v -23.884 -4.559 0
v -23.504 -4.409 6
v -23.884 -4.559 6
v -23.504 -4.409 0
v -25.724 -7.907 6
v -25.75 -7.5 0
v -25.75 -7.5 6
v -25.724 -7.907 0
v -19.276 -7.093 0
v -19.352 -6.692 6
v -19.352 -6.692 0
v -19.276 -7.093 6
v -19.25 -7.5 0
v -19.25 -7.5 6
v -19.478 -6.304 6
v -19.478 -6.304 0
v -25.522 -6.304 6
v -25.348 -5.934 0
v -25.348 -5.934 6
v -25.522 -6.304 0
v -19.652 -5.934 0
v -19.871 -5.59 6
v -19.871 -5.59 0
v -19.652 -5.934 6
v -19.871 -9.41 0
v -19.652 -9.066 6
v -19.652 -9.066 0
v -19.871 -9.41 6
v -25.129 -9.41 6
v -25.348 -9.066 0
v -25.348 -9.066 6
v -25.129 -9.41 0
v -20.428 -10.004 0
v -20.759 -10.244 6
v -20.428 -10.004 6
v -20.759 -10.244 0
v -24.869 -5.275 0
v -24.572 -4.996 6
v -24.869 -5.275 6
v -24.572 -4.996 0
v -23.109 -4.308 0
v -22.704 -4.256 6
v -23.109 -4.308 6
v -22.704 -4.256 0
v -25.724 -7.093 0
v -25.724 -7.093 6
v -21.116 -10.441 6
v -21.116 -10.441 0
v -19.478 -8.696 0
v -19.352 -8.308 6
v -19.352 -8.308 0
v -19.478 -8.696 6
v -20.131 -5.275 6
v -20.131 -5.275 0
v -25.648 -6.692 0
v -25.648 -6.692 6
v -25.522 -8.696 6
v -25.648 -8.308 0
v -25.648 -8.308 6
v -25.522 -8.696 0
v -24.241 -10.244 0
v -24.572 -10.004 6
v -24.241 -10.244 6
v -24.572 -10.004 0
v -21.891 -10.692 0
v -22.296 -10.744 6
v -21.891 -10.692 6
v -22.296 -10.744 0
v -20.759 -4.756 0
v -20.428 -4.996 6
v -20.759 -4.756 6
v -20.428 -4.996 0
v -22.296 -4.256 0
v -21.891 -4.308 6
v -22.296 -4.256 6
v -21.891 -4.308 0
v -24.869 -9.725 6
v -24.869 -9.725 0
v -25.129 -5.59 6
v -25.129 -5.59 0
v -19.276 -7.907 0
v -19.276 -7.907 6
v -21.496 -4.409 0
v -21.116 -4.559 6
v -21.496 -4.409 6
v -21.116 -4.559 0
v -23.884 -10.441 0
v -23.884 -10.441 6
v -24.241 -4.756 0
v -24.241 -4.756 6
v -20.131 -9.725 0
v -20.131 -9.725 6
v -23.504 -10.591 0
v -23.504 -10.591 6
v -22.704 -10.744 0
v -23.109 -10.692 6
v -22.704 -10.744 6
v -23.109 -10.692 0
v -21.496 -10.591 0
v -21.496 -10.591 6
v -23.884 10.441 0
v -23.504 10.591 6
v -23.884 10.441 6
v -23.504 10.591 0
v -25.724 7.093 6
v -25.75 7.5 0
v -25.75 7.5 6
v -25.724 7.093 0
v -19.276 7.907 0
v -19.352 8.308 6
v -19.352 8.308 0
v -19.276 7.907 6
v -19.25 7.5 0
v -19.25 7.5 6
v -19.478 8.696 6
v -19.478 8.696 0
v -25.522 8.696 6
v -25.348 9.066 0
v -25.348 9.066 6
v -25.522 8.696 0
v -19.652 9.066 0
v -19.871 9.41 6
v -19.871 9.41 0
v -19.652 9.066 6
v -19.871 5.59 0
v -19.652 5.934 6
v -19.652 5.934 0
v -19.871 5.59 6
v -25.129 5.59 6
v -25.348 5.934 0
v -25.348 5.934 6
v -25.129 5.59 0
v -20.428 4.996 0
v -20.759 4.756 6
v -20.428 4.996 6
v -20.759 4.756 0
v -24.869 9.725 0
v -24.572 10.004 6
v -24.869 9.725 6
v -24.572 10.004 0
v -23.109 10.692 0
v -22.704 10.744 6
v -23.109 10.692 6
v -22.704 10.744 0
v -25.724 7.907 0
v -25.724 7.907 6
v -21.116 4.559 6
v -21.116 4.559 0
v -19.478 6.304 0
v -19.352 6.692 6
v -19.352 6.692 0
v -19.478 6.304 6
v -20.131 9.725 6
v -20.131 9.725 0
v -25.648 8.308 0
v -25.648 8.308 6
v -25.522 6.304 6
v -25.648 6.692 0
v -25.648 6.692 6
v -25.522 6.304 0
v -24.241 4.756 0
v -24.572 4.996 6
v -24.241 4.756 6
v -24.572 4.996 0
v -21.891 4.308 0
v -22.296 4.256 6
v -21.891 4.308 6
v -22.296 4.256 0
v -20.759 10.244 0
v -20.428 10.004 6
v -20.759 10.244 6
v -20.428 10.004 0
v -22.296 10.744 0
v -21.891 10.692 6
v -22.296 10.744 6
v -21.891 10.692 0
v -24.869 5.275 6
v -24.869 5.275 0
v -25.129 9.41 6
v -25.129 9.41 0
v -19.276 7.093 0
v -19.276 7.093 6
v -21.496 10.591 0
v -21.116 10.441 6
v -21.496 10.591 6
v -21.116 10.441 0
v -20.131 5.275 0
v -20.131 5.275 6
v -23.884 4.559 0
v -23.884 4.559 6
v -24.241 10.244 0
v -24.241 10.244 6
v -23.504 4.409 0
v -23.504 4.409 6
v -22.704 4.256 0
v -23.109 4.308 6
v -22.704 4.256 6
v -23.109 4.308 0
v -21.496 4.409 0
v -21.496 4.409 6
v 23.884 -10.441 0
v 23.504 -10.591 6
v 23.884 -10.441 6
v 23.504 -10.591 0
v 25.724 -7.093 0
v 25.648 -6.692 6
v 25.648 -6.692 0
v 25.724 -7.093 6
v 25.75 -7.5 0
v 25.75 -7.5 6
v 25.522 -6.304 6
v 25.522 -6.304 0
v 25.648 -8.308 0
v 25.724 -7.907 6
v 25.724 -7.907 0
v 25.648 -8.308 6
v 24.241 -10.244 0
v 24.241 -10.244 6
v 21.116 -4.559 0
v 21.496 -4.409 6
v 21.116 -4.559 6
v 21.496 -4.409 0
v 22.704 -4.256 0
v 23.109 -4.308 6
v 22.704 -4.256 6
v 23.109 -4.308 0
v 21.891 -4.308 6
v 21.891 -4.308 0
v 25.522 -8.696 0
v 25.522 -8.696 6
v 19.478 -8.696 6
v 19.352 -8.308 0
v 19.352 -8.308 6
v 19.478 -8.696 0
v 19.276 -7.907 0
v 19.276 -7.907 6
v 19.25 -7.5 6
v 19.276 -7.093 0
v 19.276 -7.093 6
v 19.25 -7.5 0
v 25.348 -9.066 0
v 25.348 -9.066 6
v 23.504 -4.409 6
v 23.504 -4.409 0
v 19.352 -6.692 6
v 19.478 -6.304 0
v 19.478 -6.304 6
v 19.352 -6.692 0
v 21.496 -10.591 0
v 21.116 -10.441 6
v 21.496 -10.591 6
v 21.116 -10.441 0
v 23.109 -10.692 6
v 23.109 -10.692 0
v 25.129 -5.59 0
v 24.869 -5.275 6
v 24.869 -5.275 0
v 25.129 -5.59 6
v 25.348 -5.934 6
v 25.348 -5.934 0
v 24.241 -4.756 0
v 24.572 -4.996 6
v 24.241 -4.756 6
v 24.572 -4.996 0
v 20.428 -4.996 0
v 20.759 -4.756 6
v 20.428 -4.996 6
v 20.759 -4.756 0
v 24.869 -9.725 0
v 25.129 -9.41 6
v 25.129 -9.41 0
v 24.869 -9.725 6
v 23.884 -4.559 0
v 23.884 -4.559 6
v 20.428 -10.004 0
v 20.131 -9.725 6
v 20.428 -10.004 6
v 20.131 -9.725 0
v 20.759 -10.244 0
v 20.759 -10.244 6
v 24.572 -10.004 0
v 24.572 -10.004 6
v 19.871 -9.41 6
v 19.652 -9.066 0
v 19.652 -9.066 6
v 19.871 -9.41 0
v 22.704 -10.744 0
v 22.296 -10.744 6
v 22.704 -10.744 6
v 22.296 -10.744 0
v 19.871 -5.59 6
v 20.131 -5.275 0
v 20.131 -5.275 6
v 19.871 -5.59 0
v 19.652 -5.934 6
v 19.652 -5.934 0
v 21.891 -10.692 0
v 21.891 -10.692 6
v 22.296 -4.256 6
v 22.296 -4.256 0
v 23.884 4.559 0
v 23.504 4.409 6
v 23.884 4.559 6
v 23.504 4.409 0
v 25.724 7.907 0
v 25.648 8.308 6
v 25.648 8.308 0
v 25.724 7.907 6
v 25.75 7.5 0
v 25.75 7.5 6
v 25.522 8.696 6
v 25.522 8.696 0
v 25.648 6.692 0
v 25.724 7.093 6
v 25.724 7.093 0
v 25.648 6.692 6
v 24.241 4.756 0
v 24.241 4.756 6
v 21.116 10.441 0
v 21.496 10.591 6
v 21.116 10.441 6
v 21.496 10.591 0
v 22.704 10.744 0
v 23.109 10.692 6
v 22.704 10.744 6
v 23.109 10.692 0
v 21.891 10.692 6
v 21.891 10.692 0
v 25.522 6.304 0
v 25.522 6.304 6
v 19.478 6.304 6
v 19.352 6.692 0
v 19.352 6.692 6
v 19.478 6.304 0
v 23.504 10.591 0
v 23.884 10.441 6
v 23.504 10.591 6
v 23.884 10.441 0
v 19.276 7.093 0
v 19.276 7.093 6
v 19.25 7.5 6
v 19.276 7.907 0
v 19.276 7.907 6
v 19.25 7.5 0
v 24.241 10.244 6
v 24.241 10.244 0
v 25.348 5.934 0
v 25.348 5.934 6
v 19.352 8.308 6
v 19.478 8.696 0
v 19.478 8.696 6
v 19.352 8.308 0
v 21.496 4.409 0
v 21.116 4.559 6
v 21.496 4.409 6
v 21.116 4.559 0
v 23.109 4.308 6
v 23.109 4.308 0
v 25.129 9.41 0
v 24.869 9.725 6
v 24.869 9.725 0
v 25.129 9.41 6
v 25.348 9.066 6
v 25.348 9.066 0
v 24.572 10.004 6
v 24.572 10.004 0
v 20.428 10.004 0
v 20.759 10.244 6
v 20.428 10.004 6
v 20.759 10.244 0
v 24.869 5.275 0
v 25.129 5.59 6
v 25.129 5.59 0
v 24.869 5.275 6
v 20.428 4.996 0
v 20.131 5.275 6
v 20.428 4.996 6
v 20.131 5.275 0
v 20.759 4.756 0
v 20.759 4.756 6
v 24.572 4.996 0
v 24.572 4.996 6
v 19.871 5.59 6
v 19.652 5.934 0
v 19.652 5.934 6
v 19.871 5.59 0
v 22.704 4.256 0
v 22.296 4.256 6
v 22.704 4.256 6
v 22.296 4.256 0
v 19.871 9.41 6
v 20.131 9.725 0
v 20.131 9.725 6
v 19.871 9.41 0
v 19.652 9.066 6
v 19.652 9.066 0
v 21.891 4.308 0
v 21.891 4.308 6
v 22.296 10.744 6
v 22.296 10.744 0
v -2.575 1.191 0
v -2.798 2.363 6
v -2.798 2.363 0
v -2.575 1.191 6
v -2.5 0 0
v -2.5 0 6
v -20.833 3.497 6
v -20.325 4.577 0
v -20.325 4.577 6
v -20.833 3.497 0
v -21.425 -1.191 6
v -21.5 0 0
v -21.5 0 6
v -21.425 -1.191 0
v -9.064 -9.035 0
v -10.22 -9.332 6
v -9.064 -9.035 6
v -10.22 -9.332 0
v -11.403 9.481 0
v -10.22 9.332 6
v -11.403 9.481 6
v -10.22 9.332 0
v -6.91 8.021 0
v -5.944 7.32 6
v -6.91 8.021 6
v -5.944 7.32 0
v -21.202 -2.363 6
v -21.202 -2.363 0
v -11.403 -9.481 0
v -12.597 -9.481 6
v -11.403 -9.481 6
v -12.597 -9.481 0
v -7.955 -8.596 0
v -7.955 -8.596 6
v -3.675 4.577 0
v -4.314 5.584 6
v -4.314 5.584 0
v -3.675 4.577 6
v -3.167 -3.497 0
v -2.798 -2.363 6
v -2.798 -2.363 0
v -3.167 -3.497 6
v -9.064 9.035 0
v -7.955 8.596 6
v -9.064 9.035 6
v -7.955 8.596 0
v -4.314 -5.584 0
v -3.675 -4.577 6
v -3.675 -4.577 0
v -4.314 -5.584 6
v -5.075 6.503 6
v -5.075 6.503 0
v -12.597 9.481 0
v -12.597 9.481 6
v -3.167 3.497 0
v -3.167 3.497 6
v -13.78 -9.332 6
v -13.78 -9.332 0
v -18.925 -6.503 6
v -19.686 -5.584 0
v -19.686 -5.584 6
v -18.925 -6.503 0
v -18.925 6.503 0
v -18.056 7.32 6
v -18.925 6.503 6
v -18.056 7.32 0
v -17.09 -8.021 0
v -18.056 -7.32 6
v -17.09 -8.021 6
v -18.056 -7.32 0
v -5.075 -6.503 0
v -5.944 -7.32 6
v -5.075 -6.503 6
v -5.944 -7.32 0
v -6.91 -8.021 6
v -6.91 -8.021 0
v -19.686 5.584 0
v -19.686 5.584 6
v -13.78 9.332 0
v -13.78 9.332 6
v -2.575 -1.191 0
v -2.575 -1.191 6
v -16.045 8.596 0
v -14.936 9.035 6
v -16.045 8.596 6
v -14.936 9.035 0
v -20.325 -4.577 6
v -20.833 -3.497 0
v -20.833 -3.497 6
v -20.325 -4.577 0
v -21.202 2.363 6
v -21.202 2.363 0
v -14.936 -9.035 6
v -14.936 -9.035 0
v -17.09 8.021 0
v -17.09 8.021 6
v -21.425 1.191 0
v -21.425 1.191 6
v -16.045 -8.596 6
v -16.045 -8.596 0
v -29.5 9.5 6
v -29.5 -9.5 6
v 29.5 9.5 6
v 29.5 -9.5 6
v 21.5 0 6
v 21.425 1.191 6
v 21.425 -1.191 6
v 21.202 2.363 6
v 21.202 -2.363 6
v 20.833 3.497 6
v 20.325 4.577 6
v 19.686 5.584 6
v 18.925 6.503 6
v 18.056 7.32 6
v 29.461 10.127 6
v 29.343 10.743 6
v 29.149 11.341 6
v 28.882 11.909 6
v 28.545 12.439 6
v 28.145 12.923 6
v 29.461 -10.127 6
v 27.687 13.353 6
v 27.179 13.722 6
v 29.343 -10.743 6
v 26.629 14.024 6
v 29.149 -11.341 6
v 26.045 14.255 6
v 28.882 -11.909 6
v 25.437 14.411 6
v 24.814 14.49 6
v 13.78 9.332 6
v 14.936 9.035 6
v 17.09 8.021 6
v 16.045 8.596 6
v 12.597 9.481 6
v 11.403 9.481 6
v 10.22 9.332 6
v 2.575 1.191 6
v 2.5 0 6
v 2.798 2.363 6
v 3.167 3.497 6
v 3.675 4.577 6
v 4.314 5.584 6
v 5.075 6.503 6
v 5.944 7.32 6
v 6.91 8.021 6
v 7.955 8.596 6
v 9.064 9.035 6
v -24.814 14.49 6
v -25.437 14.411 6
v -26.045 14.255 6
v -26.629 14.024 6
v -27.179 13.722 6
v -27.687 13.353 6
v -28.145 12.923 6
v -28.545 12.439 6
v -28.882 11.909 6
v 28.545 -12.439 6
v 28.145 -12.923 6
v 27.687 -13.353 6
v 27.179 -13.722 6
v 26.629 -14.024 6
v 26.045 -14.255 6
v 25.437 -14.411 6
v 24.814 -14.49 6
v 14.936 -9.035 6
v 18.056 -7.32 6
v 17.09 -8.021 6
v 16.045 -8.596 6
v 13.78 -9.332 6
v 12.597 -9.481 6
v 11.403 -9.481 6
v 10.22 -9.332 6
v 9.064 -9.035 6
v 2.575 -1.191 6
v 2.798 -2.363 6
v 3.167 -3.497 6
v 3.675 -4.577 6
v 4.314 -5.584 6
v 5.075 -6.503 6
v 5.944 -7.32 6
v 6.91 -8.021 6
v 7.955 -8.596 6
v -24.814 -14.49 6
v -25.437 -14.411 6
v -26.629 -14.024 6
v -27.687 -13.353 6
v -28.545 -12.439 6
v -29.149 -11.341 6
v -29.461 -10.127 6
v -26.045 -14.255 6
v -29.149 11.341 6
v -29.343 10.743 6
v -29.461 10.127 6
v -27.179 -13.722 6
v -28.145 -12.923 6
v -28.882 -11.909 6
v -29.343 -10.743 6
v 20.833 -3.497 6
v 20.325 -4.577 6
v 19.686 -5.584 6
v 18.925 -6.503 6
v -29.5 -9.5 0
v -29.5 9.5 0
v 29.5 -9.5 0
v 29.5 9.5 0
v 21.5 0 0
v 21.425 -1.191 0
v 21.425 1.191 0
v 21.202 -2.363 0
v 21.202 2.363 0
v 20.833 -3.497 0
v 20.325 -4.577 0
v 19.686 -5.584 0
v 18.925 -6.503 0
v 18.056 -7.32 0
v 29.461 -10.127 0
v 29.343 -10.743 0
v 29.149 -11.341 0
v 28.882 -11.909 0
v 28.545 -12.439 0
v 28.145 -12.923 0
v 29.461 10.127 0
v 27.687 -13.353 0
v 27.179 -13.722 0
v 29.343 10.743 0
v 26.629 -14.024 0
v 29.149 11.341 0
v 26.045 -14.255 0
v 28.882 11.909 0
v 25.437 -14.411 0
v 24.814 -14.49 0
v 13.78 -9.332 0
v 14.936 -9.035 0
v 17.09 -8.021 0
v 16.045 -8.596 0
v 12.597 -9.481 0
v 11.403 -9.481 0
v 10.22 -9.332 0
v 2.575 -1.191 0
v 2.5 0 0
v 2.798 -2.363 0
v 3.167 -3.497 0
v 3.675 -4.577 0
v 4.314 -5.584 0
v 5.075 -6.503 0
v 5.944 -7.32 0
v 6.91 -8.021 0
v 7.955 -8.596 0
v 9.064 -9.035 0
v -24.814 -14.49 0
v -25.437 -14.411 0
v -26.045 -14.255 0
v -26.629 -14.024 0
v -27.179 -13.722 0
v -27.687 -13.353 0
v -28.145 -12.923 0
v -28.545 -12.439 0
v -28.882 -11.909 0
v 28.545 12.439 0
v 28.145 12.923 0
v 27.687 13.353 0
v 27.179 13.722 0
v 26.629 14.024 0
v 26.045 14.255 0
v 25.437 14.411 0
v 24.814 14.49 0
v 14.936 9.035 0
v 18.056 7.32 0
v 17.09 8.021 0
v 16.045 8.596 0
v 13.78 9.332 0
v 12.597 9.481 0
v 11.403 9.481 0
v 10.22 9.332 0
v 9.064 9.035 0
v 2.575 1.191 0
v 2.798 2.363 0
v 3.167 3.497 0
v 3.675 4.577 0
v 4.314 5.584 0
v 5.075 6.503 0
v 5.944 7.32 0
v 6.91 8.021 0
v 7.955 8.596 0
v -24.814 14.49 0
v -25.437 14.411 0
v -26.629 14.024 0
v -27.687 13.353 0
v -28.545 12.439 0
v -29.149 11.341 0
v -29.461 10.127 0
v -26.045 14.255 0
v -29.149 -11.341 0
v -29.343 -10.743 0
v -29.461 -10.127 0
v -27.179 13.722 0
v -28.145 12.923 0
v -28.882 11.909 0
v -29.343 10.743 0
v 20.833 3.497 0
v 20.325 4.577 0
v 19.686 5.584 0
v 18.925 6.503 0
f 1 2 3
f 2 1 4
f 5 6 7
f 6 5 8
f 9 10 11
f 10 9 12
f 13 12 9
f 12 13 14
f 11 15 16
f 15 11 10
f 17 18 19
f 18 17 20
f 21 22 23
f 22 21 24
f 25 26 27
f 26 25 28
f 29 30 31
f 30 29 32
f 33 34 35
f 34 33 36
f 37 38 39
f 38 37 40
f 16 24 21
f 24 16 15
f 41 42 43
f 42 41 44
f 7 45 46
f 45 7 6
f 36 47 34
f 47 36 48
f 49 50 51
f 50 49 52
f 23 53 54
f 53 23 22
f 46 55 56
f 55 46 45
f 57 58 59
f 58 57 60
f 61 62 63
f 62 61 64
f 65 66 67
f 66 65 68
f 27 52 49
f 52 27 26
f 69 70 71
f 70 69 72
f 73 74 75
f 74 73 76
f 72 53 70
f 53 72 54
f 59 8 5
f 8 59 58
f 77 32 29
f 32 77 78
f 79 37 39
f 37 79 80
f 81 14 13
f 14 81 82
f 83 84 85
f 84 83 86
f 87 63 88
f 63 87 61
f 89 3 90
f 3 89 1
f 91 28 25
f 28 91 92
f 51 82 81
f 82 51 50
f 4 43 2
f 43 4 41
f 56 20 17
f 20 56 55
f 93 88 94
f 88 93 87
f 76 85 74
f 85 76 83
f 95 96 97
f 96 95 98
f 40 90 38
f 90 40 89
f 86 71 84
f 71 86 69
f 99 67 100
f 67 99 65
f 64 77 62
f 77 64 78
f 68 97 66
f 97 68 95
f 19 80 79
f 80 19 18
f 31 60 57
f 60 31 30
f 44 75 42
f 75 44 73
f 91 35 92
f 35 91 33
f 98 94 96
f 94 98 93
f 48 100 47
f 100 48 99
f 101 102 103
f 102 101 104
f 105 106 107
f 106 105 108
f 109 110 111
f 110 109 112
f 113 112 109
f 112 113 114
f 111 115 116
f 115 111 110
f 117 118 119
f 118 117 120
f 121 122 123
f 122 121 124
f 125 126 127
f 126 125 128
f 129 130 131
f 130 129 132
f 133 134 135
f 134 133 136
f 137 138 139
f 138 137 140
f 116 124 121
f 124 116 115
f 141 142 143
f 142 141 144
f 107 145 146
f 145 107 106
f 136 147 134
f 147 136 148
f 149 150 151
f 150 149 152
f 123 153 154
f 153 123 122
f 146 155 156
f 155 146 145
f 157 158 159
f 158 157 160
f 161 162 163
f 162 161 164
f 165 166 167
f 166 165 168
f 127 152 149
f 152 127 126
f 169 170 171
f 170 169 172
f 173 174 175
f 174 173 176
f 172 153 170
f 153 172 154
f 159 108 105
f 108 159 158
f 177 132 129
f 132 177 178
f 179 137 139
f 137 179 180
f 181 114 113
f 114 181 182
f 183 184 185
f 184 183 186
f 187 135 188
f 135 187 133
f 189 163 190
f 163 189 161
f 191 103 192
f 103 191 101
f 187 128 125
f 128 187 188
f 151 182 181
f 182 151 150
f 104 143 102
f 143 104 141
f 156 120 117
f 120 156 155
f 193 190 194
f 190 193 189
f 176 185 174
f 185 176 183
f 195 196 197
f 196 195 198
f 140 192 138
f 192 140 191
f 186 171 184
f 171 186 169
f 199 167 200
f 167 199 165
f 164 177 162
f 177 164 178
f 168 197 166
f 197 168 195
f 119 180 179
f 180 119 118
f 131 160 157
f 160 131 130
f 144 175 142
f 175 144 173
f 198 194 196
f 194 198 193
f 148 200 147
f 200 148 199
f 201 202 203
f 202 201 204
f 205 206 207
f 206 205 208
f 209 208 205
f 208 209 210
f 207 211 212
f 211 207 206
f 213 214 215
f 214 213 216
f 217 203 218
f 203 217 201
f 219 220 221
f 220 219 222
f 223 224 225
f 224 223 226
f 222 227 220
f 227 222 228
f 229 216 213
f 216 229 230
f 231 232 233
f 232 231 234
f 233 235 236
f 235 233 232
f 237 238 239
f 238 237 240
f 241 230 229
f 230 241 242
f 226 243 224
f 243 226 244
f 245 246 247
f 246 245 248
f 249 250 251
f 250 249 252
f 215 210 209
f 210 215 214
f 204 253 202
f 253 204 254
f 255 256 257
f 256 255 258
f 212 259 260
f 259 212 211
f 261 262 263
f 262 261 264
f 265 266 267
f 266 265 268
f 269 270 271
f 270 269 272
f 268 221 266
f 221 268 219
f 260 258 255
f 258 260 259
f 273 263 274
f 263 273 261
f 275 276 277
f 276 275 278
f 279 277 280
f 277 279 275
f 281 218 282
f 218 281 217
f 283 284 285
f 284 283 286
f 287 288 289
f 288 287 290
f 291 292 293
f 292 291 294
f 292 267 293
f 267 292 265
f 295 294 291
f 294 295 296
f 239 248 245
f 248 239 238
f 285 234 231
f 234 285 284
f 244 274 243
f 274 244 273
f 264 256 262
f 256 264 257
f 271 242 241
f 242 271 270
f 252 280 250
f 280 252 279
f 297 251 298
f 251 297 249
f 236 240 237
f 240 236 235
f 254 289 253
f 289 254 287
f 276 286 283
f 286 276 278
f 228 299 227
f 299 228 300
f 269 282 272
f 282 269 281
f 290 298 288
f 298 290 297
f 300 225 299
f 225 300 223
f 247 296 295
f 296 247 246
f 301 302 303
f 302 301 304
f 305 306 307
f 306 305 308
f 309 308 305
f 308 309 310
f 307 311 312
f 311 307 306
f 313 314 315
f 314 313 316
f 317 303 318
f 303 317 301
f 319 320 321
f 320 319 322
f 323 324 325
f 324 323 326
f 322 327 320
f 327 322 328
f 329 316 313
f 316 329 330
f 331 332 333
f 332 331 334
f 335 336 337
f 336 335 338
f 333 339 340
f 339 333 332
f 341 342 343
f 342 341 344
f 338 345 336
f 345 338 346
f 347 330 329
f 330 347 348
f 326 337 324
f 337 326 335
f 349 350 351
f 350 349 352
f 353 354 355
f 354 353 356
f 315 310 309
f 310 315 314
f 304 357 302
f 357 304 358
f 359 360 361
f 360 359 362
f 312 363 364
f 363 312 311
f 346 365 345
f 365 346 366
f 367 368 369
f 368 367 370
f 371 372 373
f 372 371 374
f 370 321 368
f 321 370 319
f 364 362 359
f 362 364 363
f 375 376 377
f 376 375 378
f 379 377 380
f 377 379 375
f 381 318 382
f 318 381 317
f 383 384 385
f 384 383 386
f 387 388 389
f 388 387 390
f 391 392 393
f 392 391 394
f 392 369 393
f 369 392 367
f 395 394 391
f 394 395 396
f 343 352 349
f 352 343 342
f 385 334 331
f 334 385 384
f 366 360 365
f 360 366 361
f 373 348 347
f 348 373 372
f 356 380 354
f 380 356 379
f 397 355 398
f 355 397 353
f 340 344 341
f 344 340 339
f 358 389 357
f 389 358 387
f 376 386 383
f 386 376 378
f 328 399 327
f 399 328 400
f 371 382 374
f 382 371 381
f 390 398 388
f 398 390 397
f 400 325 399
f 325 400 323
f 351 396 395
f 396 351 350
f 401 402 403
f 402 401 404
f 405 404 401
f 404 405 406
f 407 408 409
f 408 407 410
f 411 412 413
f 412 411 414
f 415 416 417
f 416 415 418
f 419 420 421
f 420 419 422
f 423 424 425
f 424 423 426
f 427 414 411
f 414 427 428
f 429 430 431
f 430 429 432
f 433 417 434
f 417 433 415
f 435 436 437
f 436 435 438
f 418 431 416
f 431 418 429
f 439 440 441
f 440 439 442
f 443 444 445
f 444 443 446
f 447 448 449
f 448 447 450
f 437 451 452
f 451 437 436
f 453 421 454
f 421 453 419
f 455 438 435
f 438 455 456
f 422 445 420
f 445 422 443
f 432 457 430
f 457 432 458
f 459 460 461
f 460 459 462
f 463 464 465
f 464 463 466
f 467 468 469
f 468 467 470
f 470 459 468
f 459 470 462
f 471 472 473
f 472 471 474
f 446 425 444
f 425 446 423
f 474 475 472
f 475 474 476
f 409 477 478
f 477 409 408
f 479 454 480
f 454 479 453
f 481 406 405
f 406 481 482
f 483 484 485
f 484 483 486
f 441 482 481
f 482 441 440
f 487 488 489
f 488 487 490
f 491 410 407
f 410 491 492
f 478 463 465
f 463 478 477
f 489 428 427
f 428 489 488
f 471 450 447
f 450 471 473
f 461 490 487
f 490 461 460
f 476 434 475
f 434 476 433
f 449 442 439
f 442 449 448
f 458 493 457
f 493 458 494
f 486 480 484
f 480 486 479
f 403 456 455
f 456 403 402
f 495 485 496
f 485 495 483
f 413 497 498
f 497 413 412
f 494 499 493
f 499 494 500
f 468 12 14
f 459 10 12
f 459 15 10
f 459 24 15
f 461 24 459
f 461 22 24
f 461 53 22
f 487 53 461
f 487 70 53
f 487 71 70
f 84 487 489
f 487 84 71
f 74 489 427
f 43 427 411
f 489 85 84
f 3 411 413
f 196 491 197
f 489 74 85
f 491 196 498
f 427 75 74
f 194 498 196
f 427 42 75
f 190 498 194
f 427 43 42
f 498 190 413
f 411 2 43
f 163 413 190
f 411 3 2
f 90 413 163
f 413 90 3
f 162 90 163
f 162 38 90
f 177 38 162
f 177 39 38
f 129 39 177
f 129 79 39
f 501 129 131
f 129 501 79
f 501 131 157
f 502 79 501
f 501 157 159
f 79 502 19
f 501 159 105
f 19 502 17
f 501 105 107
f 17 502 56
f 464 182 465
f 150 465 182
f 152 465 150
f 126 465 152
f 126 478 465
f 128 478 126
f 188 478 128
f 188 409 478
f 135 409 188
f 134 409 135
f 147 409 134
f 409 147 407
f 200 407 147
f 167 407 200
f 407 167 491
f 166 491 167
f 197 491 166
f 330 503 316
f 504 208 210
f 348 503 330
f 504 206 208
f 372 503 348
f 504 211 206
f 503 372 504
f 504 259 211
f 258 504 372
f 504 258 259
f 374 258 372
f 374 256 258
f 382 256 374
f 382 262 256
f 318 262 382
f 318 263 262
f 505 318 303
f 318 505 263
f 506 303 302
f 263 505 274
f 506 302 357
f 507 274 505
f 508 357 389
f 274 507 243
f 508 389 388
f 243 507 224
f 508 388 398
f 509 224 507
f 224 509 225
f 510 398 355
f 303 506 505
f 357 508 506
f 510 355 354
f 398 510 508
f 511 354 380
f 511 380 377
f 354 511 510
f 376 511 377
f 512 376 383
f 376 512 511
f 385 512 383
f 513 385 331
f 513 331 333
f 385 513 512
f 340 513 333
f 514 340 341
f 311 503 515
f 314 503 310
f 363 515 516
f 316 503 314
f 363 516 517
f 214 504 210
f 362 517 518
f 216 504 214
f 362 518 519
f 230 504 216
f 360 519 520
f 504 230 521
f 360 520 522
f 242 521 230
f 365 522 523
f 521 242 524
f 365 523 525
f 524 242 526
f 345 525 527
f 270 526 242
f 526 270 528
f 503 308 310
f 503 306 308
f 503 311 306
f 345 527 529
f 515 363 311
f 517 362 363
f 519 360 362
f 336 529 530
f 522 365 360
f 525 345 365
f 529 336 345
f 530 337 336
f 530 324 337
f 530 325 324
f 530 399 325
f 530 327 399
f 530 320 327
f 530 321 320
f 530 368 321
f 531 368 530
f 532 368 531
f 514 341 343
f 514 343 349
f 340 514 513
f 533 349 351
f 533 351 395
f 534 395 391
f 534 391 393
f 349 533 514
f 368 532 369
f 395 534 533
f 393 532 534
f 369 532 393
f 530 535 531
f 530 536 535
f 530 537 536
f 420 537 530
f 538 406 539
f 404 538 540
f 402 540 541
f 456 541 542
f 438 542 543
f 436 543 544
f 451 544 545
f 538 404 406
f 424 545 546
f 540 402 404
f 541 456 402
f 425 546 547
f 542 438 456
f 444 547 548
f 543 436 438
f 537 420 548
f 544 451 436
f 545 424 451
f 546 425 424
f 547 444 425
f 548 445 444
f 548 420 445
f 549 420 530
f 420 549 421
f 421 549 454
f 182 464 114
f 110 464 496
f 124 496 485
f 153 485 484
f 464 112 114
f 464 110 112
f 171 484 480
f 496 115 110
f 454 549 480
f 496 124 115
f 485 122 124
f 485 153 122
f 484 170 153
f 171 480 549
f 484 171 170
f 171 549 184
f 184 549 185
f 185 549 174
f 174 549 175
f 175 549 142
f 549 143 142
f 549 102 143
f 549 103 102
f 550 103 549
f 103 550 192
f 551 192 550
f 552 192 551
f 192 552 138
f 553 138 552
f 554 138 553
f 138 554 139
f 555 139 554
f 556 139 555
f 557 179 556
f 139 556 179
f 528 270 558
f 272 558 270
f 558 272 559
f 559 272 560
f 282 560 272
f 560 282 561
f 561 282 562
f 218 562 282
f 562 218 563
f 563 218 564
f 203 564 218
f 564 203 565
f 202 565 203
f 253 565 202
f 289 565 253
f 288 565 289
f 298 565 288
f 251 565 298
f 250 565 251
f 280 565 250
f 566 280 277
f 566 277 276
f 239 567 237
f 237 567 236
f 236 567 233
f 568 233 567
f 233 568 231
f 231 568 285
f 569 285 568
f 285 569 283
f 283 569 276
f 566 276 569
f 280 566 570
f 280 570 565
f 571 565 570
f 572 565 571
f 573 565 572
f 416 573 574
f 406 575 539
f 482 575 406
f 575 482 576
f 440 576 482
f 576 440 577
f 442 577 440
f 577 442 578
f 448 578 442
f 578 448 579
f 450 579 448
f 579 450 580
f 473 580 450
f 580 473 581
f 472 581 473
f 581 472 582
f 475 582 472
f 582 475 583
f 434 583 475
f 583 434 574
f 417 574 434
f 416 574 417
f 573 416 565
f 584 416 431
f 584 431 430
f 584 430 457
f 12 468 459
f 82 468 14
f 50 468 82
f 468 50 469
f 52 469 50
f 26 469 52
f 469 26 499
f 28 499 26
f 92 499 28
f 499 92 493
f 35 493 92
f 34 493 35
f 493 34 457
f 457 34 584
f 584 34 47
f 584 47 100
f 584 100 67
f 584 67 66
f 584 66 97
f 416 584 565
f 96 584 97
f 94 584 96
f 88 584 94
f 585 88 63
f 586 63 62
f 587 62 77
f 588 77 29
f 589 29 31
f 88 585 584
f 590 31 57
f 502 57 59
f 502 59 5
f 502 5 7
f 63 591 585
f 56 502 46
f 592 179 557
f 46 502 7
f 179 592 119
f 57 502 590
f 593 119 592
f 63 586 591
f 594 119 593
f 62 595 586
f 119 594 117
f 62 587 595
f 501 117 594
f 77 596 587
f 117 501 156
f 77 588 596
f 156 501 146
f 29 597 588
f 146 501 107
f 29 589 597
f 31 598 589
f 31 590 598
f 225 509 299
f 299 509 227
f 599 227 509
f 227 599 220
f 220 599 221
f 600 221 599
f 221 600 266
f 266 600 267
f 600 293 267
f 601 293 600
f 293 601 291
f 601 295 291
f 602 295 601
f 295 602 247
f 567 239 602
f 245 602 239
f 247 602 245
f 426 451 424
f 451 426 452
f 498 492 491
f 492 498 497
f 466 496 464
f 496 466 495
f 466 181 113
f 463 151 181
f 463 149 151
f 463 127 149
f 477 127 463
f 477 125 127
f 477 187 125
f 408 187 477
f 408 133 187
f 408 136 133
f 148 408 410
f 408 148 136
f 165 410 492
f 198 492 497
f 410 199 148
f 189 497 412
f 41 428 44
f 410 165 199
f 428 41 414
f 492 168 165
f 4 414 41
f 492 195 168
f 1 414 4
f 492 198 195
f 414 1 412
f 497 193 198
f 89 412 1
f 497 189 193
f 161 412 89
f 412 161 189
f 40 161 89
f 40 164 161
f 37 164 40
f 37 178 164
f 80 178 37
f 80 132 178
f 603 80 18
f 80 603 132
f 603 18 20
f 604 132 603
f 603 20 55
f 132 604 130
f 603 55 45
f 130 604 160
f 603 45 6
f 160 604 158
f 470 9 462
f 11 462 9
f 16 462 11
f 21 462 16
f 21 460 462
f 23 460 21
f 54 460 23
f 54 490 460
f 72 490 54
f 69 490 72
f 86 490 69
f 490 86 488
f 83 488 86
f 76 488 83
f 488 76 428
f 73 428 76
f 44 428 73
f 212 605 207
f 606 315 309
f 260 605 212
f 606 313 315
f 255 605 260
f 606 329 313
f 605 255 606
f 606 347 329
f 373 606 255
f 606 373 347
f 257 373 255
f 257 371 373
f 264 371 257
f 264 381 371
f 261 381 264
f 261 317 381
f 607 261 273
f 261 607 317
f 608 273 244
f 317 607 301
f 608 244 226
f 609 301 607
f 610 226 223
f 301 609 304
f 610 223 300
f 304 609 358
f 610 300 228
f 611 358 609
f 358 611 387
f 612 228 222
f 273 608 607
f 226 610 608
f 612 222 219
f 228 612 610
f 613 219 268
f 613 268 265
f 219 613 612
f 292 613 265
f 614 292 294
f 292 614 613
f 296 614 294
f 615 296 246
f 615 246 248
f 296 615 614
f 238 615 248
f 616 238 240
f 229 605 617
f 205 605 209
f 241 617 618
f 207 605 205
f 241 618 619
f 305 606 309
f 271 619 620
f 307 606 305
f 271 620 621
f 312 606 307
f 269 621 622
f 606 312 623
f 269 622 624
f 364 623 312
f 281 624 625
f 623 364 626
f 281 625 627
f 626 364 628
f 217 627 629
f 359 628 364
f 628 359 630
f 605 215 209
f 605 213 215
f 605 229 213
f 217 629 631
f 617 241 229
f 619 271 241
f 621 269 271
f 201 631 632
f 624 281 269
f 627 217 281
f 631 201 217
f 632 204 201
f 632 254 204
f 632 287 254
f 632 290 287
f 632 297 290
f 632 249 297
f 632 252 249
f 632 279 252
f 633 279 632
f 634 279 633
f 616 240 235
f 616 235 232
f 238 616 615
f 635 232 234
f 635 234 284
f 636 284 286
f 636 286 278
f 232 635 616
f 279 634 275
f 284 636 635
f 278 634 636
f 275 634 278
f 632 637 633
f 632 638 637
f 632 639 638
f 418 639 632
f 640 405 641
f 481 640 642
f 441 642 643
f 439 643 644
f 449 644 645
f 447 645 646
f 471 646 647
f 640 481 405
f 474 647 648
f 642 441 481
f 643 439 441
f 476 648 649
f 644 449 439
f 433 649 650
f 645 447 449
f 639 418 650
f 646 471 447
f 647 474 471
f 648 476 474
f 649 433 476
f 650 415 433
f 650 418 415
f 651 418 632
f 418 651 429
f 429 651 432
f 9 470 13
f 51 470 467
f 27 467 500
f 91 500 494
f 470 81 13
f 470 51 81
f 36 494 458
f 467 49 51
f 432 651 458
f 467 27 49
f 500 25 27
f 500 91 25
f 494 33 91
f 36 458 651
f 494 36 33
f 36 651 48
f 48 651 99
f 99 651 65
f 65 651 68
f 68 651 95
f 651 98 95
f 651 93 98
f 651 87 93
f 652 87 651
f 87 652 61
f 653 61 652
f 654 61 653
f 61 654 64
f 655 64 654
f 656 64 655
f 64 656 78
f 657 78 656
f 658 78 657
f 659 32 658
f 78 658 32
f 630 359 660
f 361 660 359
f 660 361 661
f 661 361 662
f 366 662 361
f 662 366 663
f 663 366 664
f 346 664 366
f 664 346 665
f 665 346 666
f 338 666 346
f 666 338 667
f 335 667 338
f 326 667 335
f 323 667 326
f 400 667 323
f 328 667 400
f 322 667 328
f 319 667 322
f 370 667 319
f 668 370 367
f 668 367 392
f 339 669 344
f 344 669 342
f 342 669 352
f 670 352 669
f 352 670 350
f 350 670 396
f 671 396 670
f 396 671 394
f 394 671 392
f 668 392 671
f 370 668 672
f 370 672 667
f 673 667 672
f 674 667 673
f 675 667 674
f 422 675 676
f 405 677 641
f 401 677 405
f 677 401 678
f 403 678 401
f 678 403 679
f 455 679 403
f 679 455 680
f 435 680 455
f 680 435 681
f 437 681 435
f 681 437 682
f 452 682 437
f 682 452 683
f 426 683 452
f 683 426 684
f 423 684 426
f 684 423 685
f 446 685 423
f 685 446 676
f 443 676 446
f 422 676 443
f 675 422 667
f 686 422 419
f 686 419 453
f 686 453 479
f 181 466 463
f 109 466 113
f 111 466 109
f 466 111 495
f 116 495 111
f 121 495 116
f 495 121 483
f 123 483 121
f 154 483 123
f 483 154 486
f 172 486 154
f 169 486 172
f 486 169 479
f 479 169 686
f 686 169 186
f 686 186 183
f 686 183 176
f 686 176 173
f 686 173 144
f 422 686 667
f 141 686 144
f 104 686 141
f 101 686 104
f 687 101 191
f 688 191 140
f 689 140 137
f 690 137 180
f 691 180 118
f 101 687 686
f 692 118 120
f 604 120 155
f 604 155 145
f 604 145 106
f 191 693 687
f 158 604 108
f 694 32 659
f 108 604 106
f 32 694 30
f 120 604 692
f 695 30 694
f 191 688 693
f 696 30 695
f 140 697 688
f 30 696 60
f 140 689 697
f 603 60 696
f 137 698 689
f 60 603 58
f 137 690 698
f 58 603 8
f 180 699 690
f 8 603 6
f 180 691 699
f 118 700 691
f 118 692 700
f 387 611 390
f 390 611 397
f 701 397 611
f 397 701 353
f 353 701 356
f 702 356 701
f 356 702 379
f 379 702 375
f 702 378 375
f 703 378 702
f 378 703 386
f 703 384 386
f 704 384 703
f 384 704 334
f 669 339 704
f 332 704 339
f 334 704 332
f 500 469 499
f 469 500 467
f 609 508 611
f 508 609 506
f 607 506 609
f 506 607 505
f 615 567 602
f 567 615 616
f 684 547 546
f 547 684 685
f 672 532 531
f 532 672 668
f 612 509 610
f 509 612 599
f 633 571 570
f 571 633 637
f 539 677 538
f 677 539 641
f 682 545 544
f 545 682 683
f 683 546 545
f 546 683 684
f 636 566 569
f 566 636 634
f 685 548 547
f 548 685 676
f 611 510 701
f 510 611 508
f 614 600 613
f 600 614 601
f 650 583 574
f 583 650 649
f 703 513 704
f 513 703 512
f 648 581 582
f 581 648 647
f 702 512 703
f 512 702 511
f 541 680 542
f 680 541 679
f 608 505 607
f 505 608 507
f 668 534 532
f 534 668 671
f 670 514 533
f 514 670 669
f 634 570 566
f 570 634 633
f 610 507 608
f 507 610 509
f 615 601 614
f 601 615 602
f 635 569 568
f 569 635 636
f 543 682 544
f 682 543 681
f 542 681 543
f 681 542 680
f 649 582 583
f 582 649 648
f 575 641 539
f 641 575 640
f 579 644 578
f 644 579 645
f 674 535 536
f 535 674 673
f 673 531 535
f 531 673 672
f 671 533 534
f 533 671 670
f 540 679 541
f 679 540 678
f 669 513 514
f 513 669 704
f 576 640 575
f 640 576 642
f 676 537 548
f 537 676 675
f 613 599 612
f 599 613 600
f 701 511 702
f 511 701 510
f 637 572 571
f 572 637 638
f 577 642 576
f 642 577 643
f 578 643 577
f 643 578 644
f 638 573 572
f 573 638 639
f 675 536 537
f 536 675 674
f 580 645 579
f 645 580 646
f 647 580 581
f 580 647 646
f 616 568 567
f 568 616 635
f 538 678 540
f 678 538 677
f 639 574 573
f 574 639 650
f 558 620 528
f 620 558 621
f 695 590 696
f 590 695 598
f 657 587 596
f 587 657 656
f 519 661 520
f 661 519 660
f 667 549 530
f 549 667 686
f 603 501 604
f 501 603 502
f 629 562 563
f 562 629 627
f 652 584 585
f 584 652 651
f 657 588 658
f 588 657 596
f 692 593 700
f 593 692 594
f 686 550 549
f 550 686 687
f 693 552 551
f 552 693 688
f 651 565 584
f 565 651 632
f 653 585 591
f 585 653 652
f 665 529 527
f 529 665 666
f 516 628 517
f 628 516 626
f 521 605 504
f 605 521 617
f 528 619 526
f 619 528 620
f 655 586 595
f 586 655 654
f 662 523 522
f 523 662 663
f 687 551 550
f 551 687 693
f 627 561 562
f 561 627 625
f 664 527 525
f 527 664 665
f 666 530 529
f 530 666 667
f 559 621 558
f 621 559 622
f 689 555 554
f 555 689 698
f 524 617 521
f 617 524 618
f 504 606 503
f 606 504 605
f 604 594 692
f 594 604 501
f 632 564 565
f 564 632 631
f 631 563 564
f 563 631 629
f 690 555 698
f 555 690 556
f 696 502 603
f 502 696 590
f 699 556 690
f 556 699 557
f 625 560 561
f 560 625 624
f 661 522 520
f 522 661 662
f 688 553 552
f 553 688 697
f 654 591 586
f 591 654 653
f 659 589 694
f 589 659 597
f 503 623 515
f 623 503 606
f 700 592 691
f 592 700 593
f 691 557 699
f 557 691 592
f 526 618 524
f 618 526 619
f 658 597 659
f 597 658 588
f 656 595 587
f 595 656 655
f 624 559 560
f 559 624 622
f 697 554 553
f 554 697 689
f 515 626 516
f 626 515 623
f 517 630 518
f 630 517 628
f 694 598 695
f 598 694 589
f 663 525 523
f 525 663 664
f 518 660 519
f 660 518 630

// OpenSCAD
$fn = 50;

difference() {
	union() {
		hull() {
			translate(v = [-24.5, 9.5, 0]) {
				cylinder(h = 6, r = 5);
			}
			translate(v = [24.5, 9.5, 0]) {
				cylinder(h = 6, r = 5);
			}
			translate(v = [-24.5, -9.5, 0]) {
				cylinder(h = 6, r = 5);
			}
			translate(v = [24.5, -9.5, 0]) {
				cylinder(h = 6, r = 5);
			}
		}
	}
	union() {
		translate(v = [-22.5, -7.5, -100.0]) {
			cylinder(h = 200, r = 3.25);
		}
		translate(v = [-22.5, 7.5, -100.0]) {
			cylinder(h = 200, r = 3.25);
		}
		translate(v = [22.5, -7.5, -100.0]) {
			cylinder(h = 200, r = 3.25);
		}
		translate(v = [22.5, 7.5, -100.0]) {
			cylinder(h = 200, r = 3.25);
		}
		translate(v = [-22.5, -7.5, -100.0]) {
			cylinder(h = 200, r = 1.8);
		}
		translate(v = [-22.5, 7.5, -100.0]) {
			cylinder(h = 200, r = 1.8);
		}
		translate(v = [22.5, -7.5, -100.0]) {
			cylinder(h = 200, r = 1.8);
		}
		translate(v = [22.5, 7.5, -100.0]) {
			cylinder(h = 200, r = 1.8);
		}
		translate(v = [-12.0, 0, 0.0]) {
			cylinder(h = 6, r = 9.5);
		}
		translate(v = [12.0, 0, 0.0]) {
			cylinder(h = 6, r = 9.5);
		}
	}
}
